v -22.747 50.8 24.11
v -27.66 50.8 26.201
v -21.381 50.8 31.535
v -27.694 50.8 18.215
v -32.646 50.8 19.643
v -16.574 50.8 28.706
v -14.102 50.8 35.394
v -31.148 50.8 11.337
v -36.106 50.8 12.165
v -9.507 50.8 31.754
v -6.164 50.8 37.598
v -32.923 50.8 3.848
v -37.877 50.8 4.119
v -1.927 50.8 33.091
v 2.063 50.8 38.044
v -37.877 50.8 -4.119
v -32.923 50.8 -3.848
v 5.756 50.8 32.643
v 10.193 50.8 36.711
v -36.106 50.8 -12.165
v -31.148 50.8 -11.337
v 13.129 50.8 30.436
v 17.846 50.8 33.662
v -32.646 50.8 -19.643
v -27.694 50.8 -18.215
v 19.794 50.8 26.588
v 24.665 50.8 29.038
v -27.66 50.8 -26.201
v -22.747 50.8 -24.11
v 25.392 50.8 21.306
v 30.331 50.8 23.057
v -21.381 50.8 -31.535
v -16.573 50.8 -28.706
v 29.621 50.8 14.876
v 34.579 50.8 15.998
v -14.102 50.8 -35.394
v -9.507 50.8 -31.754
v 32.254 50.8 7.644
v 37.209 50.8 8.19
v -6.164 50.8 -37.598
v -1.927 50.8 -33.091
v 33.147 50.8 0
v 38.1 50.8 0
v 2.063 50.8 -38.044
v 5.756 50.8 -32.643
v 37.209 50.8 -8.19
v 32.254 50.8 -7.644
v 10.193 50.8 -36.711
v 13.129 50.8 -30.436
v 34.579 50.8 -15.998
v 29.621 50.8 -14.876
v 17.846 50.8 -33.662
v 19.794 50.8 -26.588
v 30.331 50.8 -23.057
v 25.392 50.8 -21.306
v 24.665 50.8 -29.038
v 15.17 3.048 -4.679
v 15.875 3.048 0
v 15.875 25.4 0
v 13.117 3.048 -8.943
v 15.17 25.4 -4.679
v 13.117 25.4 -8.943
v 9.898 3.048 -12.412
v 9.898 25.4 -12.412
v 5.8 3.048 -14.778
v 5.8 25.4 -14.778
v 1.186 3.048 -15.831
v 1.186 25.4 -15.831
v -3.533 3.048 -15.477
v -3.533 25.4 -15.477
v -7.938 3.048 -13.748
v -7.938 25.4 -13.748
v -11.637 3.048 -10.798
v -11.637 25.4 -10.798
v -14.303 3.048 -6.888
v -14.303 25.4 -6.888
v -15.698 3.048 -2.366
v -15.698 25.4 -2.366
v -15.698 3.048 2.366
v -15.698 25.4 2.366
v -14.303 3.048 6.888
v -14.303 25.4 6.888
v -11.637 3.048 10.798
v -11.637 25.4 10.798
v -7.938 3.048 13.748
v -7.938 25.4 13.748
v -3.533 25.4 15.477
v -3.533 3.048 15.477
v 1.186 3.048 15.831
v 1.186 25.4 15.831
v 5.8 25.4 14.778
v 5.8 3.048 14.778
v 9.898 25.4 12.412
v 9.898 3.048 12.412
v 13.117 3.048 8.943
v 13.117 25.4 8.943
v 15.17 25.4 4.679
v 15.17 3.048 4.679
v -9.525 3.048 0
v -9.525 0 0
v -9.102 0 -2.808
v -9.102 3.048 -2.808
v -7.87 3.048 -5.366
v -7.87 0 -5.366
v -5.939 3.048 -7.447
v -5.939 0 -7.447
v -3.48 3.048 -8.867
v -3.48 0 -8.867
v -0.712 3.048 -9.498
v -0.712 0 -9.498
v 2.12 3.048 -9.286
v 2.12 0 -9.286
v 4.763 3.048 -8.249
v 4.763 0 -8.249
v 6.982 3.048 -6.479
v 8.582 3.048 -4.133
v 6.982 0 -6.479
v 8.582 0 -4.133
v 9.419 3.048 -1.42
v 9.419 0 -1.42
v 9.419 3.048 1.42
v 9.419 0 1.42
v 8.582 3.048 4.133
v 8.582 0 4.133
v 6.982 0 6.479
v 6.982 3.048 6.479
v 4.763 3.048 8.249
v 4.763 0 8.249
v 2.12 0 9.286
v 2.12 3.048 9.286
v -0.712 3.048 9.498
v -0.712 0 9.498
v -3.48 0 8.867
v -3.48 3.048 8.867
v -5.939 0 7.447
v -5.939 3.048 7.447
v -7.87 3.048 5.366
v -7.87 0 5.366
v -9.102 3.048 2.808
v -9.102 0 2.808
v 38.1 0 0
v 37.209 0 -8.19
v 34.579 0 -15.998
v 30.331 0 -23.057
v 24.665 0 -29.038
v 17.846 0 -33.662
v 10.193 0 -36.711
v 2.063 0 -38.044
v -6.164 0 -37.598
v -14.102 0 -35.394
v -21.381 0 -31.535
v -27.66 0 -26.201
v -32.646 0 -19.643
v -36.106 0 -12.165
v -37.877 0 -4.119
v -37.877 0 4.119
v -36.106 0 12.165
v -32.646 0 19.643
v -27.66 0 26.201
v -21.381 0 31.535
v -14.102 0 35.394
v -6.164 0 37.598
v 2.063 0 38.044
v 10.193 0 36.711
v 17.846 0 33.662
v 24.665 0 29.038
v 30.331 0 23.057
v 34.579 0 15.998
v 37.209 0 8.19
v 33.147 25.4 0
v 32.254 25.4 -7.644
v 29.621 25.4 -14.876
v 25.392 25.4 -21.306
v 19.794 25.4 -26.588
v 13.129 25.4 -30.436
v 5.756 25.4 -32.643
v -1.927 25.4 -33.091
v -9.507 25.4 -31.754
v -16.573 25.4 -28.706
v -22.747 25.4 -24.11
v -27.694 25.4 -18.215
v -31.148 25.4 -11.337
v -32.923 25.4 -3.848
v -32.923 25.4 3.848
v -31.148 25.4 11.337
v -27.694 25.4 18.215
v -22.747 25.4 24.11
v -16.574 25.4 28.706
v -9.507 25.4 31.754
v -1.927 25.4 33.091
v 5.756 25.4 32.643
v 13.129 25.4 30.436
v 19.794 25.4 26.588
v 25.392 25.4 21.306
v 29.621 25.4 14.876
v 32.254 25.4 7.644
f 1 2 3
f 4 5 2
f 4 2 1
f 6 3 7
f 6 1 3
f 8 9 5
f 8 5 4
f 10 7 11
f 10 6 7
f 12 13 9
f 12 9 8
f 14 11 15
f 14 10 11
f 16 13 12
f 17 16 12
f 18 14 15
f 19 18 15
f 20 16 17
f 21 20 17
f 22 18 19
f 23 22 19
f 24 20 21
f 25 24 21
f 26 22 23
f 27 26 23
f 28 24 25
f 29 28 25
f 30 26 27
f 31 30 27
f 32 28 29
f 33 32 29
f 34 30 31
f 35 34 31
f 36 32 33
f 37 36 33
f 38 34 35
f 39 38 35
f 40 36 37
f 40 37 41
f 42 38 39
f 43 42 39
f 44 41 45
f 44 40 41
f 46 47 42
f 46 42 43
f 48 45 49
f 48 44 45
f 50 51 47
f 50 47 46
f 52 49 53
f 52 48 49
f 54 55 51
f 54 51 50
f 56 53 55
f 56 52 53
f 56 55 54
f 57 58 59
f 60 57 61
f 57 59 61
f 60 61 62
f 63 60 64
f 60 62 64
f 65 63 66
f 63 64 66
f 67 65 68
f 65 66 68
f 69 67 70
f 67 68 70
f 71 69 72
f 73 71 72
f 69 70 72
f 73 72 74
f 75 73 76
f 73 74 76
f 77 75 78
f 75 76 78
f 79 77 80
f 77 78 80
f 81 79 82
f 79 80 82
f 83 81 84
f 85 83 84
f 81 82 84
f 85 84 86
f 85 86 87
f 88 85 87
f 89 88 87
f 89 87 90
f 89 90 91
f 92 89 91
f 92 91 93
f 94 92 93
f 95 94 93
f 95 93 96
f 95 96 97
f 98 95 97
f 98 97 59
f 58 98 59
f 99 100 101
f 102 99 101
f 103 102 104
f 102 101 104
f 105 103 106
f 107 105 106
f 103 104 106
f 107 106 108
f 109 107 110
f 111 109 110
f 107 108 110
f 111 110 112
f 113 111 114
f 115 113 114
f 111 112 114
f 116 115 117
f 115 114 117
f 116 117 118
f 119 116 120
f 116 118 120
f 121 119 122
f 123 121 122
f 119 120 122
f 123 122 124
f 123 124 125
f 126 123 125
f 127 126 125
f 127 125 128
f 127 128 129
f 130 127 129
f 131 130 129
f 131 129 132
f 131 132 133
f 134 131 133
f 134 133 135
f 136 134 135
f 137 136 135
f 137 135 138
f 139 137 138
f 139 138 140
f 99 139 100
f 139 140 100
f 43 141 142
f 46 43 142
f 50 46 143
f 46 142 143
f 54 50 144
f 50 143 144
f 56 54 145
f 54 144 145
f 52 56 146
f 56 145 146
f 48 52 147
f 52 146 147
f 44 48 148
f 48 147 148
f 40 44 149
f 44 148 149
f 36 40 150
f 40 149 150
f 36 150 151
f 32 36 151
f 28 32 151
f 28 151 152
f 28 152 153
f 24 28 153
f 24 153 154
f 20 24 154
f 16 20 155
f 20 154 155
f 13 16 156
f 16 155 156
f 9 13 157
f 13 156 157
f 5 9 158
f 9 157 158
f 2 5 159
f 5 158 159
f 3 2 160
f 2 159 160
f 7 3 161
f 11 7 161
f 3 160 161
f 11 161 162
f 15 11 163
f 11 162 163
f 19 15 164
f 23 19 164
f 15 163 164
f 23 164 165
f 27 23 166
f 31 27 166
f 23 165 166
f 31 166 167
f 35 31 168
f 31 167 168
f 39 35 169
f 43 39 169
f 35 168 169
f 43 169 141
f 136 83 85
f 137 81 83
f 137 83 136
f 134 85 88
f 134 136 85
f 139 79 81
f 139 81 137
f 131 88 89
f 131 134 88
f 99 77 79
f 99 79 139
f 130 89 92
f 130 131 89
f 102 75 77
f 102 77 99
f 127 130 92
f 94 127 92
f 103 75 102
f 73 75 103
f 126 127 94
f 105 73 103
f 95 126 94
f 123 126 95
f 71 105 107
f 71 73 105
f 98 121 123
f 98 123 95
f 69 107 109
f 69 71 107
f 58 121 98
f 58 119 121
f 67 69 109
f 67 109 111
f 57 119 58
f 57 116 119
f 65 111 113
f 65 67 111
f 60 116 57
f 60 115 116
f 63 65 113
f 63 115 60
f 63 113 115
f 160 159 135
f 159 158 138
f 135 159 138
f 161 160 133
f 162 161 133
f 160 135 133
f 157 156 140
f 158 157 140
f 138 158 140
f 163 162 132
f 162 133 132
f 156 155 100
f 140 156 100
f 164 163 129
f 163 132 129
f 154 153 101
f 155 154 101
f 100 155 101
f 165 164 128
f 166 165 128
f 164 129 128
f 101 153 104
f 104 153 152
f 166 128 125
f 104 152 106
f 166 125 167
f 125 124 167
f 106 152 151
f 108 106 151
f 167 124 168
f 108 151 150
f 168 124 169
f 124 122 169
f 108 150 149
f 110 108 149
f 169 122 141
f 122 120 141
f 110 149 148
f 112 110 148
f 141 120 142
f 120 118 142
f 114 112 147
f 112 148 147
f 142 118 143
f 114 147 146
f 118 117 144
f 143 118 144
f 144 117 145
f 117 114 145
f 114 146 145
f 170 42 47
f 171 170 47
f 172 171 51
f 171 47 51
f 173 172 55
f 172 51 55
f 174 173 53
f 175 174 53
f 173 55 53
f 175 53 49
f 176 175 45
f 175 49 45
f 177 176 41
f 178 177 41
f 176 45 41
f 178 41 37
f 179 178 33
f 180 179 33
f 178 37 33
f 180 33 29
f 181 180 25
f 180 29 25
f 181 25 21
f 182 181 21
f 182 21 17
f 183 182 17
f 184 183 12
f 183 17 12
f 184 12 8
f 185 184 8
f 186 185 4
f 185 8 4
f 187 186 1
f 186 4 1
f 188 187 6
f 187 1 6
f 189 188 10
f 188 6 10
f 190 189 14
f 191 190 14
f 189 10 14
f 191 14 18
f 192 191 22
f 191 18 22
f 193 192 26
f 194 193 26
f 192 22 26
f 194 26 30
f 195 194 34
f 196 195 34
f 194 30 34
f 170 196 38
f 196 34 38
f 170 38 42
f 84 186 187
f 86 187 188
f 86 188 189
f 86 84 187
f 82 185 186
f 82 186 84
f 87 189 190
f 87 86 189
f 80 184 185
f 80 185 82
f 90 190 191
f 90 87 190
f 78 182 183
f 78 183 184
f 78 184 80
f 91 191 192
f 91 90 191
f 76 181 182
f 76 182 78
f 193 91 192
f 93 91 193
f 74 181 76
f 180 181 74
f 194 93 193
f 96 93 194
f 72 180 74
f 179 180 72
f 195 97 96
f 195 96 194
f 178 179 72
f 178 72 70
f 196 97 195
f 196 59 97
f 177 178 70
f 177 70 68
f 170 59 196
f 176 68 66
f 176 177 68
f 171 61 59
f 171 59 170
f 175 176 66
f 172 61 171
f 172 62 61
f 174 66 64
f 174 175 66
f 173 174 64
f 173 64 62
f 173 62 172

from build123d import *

# Parameters (mm, degrees)
SKETCH1_R           = 38.1
BOSS_EXTRUDE2_DEPTH = 50.8
SKETCH3_R           = 15.875
CUT_EXTRUDE2_DEPTH  = 47.752
SKETCH3_6_R         = 33.147
SKETCH3_6_R_2       = 15.875
CUT_EXTRUDE3_DEPTH  = 25.4
SKETCH4_R           = 9.525
CUT_EXTRUDE4_DEPTH  = 3.048


with BuildPart() as part:
    # Sketch1 → Boss-Extrude2 (new body)
    with BuildSketch(Plane(origin=(0, 0, 0), x_dir=(1, 0, 0), z_dir=(0, 1, 0))):
        Circle(SKETCH1_R)
    extrude(amount=BOSS_EXTRUDE2_DEPTH)

    # Sketch3 → Cut-Extrude2 (cut)
    with BuildSketch(Plane(origin=(0, 50.8, 0), x_dir=(1, 0, 0), z_dir=(0, 1, 0))):
        Circle(SKETCH3_R)
    extrude(amount=-CUT_EXTRUDE2_DEPTH, mode=Mode.SUBTRACT)

    # Sketch3<6> → Cut-Extrude3 (cut)
    with BuildSketch(Plane(origin=(0, 50.8, 0), x_dir=(1, 0, 0), z_dir=(0, 1, 0))):
        Circle(SKETCH3_6_R)
        Circle(SKETCH3_6_R_2, mode=Mode.SUBTRACT)
    extrude(amount=-CUT_EXTRUDE3_DEPTH, mode=Mode.SUBTRACT)

    # Sketch4 → Cut-Extrude4 (cut)
    with BuildSketch(Plane(origin=(0, 0, 0), x_dir=(-1, 0, 0), z_dir=(0, -1, 0))):
        Circle(SKETCH4_R)
    extrude(amount=-CUT_EXTRUDE4_DEPTH, mode=Mode.SUBTRACT)


solid = part.part
